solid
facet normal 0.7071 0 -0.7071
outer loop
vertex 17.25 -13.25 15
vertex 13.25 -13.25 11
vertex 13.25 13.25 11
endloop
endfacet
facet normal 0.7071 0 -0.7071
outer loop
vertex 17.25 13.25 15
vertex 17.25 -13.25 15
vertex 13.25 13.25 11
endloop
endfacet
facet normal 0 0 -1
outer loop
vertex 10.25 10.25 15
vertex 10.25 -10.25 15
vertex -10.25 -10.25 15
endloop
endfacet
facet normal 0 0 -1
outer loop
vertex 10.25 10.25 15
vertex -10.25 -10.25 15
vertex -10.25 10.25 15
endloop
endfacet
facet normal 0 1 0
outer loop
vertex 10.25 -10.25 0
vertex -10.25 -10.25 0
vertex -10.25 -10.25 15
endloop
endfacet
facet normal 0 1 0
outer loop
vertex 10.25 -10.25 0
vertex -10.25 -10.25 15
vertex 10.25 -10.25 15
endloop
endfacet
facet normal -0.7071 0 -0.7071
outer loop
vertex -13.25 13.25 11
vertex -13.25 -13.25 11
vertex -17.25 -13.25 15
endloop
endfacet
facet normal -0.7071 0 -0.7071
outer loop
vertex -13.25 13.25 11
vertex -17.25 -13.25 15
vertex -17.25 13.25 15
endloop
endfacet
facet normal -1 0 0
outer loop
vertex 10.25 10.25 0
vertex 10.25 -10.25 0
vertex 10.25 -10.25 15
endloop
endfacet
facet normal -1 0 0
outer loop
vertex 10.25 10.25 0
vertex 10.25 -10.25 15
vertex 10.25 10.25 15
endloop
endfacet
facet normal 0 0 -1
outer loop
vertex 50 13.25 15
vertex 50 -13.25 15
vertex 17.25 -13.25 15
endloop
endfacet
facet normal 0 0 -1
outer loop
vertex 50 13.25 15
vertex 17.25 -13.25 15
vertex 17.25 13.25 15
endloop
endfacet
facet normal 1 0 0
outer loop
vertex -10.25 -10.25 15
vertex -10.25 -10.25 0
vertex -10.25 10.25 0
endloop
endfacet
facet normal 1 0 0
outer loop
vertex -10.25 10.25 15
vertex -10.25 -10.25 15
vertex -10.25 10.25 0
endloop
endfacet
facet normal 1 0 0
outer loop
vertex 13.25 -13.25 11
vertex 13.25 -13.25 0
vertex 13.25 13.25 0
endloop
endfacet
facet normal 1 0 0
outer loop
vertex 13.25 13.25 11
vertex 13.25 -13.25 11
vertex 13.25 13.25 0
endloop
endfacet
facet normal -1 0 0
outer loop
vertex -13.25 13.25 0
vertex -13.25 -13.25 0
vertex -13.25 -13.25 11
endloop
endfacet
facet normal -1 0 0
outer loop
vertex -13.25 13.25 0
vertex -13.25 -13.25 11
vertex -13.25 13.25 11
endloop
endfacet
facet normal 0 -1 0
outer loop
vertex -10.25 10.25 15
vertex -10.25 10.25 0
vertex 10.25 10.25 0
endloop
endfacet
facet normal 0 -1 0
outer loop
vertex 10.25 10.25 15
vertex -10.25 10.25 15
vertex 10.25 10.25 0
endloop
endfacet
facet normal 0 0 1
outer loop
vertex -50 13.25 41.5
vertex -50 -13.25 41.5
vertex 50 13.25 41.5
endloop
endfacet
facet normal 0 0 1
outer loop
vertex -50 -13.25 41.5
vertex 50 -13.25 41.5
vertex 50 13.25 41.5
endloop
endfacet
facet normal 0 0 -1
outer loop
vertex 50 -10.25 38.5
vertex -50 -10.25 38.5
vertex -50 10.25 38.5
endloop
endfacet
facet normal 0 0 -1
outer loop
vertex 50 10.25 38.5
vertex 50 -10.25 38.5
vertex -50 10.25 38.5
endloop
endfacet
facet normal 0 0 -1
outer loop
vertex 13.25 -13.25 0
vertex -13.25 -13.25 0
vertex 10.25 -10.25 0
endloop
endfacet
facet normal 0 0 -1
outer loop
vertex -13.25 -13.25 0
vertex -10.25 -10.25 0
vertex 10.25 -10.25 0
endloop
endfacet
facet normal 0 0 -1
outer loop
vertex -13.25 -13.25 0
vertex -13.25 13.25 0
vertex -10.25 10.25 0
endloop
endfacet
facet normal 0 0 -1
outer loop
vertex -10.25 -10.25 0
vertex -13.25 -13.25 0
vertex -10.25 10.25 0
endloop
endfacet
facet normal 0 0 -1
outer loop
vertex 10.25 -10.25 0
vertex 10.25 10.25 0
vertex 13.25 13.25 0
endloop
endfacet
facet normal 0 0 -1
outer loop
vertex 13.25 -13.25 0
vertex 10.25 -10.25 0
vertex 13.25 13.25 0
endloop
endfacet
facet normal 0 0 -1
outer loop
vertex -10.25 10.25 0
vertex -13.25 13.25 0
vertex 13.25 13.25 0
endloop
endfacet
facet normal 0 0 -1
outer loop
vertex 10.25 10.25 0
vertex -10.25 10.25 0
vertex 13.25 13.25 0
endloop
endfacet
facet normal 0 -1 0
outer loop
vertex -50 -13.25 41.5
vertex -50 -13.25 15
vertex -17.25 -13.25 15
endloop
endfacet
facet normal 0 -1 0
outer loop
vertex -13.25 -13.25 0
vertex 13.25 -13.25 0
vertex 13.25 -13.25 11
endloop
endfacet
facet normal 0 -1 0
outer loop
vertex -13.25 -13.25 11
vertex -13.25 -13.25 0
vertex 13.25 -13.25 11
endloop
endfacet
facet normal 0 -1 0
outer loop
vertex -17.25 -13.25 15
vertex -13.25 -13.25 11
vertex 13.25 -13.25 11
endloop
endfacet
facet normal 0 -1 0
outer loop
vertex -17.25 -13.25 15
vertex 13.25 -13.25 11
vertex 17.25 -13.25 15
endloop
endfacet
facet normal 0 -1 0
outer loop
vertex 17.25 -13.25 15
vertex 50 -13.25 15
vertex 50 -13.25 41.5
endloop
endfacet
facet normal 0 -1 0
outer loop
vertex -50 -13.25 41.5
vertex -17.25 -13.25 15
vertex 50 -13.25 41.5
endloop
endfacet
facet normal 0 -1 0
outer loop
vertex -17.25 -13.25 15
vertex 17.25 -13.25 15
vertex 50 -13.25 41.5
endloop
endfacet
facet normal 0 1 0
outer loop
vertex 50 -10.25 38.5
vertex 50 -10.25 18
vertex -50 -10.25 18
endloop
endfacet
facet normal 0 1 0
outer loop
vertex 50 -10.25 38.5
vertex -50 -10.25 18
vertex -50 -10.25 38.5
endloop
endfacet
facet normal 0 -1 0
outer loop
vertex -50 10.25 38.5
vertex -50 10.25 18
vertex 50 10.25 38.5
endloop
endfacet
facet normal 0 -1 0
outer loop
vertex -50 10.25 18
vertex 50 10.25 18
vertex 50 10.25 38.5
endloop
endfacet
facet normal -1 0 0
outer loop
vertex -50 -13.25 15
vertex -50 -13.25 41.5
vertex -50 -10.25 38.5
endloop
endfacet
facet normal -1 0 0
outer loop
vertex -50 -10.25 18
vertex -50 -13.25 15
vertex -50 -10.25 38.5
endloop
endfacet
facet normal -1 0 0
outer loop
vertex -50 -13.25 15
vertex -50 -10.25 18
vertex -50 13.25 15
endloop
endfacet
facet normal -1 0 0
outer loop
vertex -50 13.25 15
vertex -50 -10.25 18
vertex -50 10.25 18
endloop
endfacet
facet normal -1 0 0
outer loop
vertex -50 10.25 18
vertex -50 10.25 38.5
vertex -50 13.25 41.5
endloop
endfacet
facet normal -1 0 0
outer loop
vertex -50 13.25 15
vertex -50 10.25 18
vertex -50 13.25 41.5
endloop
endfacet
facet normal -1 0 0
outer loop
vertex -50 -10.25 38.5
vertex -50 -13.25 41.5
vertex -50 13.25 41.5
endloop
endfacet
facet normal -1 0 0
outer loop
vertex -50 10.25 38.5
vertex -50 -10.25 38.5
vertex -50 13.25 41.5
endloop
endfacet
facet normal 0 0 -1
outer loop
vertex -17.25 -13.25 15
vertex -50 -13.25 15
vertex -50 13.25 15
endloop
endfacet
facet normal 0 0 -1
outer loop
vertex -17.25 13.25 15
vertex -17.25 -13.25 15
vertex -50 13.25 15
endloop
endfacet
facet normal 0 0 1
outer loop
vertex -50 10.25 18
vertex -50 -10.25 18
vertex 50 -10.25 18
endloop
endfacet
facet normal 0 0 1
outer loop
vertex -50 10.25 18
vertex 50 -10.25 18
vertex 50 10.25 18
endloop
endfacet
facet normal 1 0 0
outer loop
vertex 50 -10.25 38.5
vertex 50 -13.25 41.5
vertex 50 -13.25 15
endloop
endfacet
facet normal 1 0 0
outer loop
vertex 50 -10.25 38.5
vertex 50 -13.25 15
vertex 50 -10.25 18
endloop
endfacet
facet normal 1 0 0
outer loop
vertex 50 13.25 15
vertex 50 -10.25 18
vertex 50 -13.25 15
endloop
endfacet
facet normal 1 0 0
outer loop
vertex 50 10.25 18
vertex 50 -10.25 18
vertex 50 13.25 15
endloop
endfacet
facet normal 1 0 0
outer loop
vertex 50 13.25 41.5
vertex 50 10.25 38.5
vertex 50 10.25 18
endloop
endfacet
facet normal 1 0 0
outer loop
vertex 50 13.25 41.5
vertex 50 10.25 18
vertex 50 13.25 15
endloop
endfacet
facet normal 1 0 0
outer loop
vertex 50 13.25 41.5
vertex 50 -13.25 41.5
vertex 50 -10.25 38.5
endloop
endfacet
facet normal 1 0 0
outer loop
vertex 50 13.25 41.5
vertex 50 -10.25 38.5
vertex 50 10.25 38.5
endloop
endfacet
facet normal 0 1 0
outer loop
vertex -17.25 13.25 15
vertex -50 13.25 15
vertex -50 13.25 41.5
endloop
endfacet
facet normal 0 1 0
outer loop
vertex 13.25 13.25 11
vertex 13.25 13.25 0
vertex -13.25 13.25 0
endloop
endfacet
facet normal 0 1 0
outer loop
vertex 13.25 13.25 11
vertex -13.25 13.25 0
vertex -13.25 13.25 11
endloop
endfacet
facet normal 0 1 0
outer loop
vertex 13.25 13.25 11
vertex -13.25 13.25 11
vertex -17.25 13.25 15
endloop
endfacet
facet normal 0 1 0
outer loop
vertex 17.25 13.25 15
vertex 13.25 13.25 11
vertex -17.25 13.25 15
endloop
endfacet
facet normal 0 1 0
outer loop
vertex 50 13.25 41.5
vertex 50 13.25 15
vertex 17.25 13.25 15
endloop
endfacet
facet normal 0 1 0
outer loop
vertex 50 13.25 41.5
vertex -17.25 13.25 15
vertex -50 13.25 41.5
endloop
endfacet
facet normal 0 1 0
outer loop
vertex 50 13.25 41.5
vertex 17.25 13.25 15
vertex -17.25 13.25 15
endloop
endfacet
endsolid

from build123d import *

# Parameters (mm, degrees)
SKETCH_W      = 26.5
SKETCH_H      = 26.5
SKETCH_W_2    = 20.5
SKETCH_H_2    = 20.5
PAD_DEPTH     = 15
SKETCH001_W   = 26.5
SKETCH001_H   = 26.5
SKETCH001_W_2 = 20.5
SKETCH001_H_2 = 20.5
PAD001_DEPTH  = 50
CHAMFER_SIZE  = 4


with BuildPart() as part:
    # Sketch → Pad (new body)
    with BuildSketch(Plane.XY):
        Rectangle(SKETCH_W, SKETCH_H)
        Rectangle(SKETCH_W_2, SKETCH_H_2, mode=Mode.SUBTRACT)
    extrude(amount=PAD_DEPTH)

    # Sketch001 → Pad001 (join, symmetric)
    with BuildSketch(Plane.YZ):
        with Locations((0, 28.25)):
            Rectangle(SKETCH001_W, SKETCH001_H)
        with Locations((0, 28.25)):
            Rectangle(SKETCH001_W_2, SKETCH001_H_2, mode=Mode.SUBTRACT)
    extrude(amount=PAD001_DEPTH, both=True)

    # Chamfer
    chamfer_edges = [part.edges().sort_by_distance(p)[0] for p in [
        (13.25, 0, 15),
        (-13.25, 0, 15),
    ]]
    chamfer(chamfer_edges, length=CHAMFER_SIZE)


solid = part.part
